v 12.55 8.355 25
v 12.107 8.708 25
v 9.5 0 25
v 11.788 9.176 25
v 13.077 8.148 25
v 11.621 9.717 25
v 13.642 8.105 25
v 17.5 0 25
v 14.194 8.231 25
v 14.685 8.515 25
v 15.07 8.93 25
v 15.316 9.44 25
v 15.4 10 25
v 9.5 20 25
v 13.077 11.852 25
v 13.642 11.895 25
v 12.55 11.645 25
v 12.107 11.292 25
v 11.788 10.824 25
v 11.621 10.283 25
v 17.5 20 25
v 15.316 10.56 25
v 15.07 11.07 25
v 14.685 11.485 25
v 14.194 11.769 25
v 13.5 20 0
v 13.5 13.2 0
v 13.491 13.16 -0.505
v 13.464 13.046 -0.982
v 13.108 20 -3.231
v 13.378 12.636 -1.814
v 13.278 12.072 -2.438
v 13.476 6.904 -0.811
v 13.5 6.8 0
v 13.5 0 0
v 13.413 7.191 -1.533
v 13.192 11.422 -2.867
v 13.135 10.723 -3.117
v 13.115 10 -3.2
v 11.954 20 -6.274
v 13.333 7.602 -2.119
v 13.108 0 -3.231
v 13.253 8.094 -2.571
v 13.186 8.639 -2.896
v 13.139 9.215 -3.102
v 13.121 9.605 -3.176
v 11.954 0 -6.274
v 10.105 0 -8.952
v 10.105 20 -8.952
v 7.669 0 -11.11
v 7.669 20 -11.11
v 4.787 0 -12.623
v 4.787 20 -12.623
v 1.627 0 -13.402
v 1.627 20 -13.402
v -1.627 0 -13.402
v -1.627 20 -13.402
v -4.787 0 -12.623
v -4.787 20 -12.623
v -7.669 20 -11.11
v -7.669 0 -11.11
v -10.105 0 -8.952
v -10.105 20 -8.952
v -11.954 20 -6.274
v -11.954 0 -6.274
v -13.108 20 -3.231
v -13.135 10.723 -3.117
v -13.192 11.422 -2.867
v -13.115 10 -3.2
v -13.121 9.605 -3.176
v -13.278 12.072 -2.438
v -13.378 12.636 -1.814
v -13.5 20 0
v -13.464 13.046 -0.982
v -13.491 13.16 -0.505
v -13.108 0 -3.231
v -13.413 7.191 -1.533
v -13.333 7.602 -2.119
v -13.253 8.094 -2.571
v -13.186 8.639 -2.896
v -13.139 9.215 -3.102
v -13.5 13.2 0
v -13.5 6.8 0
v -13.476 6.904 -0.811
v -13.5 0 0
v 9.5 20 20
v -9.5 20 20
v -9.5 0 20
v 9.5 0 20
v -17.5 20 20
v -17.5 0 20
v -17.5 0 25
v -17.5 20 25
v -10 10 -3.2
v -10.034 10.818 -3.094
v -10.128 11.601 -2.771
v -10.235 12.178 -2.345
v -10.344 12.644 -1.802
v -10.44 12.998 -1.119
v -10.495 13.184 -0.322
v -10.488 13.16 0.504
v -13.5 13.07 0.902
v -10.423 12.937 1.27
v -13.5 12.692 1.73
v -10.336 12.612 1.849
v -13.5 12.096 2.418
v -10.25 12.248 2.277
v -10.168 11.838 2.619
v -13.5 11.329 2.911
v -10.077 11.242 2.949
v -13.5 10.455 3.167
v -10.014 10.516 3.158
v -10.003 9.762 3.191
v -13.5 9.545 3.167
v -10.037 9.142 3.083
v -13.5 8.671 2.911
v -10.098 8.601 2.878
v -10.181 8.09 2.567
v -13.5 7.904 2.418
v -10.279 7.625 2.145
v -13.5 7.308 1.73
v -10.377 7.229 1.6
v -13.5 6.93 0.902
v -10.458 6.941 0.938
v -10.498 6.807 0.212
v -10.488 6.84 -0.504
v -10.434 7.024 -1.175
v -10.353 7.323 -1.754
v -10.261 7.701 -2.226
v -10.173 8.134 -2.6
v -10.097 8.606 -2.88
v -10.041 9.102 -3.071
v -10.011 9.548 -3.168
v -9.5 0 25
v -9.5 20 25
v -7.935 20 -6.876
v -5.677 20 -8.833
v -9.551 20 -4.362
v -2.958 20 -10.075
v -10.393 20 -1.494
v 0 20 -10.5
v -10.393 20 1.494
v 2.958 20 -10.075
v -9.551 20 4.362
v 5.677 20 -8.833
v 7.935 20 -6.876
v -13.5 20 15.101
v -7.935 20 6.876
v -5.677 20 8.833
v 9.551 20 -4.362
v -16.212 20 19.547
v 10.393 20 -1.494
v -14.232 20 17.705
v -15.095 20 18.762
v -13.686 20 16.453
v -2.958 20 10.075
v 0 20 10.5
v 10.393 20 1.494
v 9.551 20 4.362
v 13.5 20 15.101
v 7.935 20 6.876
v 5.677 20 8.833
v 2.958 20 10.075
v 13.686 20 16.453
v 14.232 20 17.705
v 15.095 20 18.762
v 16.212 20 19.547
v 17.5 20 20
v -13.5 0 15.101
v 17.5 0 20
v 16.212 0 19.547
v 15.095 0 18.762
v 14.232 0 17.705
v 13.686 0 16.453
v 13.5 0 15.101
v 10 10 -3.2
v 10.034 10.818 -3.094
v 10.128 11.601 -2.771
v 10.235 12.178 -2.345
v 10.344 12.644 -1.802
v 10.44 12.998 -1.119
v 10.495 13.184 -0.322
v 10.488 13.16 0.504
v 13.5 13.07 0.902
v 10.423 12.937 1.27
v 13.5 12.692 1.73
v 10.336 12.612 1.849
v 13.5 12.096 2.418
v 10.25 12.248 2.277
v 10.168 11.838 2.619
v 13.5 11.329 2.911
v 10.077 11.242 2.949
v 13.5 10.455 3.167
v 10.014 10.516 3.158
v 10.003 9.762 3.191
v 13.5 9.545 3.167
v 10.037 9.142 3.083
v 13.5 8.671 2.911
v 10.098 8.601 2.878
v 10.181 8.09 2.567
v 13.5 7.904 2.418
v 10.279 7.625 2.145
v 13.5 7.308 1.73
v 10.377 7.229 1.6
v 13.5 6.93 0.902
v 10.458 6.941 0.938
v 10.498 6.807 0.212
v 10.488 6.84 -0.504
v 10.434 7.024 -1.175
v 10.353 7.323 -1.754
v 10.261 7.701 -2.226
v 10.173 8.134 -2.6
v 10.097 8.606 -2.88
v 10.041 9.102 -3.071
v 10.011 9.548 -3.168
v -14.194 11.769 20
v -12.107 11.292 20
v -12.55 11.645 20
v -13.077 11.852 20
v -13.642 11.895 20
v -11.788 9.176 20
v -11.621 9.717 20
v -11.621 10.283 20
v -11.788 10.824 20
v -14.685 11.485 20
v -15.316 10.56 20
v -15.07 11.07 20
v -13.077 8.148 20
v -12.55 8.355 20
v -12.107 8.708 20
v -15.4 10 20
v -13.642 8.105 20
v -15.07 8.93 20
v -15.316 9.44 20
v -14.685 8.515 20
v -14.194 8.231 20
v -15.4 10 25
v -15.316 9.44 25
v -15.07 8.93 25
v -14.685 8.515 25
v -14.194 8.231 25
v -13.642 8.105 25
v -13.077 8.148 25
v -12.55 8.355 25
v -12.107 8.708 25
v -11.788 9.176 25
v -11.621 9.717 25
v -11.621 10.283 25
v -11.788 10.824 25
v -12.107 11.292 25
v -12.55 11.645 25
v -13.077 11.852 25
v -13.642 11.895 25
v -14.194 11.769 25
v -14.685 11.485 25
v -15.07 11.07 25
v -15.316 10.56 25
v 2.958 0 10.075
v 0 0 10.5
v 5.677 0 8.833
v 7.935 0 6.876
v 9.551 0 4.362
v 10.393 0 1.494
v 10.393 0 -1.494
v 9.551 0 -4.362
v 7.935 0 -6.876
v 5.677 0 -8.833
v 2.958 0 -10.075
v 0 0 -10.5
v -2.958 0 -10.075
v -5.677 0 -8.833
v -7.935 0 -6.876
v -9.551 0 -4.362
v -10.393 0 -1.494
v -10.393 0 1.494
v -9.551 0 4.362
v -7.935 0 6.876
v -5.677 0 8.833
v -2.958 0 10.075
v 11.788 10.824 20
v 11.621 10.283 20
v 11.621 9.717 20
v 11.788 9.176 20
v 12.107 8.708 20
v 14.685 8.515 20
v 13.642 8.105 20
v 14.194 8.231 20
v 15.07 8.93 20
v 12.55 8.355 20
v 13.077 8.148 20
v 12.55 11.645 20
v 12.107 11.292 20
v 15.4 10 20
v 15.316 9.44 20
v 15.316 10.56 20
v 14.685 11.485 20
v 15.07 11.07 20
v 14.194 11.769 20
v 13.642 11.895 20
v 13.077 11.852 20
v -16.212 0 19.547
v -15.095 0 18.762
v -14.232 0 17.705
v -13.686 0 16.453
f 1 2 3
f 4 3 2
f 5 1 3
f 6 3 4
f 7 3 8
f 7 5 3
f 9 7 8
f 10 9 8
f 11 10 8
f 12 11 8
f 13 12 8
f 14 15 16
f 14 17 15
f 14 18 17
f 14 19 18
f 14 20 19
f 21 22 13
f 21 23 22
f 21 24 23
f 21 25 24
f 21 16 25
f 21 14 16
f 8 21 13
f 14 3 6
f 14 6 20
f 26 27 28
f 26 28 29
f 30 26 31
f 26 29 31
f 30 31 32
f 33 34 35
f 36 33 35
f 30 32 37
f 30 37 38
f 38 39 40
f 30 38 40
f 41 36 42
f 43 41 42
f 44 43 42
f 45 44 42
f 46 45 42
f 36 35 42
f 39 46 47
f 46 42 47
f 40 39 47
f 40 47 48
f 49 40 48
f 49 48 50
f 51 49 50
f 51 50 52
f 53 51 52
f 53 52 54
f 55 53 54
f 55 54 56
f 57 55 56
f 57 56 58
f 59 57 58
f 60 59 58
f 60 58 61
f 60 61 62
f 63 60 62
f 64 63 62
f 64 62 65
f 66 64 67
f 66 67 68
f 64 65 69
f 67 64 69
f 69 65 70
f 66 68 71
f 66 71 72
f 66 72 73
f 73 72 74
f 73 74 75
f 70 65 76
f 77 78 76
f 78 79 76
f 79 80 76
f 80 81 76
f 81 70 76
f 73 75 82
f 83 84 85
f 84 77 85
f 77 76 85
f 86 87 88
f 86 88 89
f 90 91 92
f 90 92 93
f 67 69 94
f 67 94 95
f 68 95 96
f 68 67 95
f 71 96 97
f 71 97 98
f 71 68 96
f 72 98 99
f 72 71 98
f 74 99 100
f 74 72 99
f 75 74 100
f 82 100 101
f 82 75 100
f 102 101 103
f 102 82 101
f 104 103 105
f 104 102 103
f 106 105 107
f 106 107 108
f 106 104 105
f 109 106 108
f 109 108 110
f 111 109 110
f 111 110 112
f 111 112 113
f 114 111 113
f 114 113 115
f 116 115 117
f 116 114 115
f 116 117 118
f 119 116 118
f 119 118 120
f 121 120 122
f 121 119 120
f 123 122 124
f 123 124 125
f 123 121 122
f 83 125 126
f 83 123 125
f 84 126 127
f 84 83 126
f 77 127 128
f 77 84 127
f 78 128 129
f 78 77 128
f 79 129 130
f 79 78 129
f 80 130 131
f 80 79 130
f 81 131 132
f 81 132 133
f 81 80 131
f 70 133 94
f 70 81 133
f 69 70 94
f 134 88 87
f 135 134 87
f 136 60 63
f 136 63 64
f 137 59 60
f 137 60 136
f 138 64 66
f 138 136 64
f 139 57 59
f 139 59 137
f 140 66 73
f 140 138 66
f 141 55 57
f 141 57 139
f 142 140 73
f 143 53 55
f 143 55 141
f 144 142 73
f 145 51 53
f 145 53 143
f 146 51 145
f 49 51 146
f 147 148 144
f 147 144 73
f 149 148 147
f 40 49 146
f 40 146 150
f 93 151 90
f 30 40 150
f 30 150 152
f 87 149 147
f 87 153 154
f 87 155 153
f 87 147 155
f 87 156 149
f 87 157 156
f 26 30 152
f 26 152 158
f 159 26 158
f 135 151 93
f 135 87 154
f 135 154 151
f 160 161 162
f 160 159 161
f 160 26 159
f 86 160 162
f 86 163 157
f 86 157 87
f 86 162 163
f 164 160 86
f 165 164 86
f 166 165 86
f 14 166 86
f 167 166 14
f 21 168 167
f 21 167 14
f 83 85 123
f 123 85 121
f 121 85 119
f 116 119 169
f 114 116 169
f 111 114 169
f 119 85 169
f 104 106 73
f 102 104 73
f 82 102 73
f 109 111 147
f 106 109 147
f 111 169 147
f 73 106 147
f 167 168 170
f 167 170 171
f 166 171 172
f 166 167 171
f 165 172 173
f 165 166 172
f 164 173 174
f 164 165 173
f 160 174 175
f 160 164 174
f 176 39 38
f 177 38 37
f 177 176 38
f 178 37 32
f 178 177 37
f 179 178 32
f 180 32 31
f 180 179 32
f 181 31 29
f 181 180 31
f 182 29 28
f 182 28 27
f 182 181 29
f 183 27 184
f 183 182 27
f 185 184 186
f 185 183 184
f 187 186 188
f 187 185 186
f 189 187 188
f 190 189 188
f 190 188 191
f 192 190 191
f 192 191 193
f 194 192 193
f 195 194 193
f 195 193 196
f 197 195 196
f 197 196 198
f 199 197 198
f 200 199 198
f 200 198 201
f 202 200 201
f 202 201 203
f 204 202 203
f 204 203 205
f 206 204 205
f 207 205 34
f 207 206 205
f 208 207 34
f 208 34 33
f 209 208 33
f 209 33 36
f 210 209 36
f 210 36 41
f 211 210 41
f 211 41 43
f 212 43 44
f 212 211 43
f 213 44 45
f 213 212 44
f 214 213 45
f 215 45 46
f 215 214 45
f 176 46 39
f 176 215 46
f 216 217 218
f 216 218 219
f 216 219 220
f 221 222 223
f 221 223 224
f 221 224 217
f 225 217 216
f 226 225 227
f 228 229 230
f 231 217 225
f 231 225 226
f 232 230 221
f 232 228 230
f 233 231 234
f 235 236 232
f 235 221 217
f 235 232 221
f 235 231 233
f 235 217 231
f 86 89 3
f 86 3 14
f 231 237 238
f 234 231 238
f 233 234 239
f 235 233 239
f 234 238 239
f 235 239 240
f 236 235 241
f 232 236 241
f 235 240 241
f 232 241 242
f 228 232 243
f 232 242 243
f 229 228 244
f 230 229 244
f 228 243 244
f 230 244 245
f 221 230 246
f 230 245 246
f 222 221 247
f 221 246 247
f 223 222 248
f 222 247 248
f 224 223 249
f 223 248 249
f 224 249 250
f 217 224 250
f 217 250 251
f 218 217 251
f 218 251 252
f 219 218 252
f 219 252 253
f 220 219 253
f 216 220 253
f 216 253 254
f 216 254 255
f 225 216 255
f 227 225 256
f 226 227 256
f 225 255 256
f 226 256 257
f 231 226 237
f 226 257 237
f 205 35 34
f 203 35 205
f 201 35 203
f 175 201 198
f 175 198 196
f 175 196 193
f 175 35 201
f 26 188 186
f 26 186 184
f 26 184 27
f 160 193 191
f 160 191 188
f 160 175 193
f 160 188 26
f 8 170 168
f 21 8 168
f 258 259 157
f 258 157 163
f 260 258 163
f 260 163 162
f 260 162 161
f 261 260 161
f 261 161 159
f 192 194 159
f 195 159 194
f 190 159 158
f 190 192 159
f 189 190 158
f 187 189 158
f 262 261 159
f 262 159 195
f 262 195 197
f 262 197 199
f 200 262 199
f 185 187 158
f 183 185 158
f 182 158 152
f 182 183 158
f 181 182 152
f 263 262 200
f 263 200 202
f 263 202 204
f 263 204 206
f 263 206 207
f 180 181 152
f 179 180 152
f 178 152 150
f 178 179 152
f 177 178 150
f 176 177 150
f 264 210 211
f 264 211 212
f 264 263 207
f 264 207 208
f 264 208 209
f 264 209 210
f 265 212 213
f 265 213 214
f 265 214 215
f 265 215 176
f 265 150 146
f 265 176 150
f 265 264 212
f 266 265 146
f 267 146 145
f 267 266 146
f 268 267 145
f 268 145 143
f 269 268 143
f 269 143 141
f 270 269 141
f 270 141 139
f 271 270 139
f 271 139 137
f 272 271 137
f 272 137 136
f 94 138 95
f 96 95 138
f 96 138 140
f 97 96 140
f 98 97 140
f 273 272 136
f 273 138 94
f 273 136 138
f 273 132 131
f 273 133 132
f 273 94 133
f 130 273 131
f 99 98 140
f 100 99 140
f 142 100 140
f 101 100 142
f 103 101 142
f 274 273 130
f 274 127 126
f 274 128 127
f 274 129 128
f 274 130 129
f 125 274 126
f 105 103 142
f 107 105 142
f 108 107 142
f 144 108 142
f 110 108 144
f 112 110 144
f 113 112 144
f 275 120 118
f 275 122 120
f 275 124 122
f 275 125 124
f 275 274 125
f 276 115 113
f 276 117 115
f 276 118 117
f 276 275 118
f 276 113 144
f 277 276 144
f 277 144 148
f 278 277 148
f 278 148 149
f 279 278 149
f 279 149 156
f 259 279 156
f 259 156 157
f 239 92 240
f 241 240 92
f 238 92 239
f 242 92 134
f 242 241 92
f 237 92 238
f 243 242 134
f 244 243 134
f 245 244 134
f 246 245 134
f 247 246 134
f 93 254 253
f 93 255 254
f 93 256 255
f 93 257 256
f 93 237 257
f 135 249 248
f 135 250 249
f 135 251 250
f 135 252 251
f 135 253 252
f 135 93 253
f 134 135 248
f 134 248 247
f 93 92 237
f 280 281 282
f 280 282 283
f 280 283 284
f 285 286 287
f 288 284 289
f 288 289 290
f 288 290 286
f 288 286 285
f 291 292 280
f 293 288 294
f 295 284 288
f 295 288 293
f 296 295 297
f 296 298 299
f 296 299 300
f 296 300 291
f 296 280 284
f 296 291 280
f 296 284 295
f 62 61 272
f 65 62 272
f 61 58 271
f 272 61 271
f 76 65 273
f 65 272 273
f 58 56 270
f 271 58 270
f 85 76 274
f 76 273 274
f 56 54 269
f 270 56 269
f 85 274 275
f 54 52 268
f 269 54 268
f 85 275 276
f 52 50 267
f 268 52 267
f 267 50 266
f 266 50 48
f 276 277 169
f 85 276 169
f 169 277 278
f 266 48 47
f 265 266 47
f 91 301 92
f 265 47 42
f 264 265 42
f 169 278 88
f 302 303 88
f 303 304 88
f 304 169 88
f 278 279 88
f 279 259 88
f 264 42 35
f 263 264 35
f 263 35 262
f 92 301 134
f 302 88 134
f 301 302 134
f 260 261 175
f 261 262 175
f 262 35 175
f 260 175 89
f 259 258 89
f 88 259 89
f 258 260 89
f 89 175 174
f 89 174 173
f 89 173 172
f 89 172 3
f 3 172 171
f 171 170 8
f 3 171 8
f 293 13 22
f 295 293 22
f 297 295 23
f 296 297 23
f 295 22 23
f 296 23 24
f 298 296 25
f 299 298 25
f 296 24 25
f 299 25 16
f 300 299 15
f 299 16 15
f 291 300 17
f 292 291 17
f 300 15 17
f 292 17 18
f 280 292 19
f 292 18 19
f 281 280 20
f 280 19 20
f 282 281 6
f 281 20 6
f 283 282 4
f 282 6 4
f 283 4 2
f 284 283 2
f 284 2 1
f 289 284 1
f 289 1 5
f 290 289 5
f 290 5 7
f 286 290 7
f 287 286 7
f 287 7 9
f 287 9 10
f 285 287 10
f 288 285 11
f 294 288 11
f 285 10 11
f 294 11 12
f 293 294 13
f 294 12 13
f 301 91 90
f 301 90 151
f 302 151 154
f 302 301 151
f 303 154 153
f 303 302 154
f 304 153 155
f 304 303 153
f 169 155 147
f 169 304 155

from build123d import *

# Parameters (mm, degrees)
SKETCH_1_R               = 13.5
SKETCH_1_R_2             = 10.5
EXTRUDE_1_DEPTH          = 20
EXTRUDE_2_REACH          = 43.286
EXTRUDE_2_END_RADIUS     = 13.5
SKETCH_5_W               = 27
SKETCH_5_H               = 20
CUT_EXTRUDE_2_DEPTH      = 32.340867888
CUT_EXTRUDE_2_DEPTH_BACK = 32.340867888
SKETCH_2_R               = 3.2
SKETCH_6_W               = 4
SKETCH_6_H               = 20
EXTRUDE_4_DEPTH          = 5
FILLET_1_R               = 5
SKETCH_7_R               = 1.9
CUT_EXTRUDE_3_DEPTH      = 5


with BuildPart() as part:
    # 草图1 → 凸台-拉伸1 (new body)
    with BuildSketch(Plane(origin=(0, 0, 0), x_dir=(1, 0, 0), z_dir=(0, 1, 0))):
        with Locations(Location((0, 0, 0), (0, 0, 270))):
            Circle(SKETCH_1_R)
        with Locations(Location((0, 0, 0), (0, 0, 270))):
            Circle(SKETCH_1_R_2, mode=Mode.SUBTRACT)
    extrude(amount=EXTRUDE_1_DEPTH)

    # 凸台-拉伸2: up to this cylinder (the profile starts outside it)
    extrude_2_end = Plane(origin=(0, 10, 0), z_dir=(0, -1, 0)) * Cylinder(EXTRUDE_2_END_RADIUS, 114.572, mode=Mode.PRIVATE)
    # 草图5 → 凸台-拉伸2 (add, up to the surface)
    with BuildSketch(Plane.XY.offset(20), mode=Mode.PRIVATE) as extrude_2_sk1:
        with Locations((0, 10)):
            Rectangle(SKETCH_5_W, SKETCH_5_H)
    extrude_2_tool1 = extrude(extrude_2_sk1.sketch, amount=-EXTRUDE_2_REACH, mode=Mode.PRIVATE) - extrude_2_end
    add(extrude_2_tool1.solids().sort_by_distance((0, 10, 20))[0])

    # 草图2 → 切除-拉伸2 (cut, two sides: drawn at the far end of the back side and taken through both)
    with BuildSketch(Plane(origin=(0, 0, 0), x_dir=(0, 0, -1), z_dir=(1, 0, 0)).offset(-CUT_EXTRUDE_2_DEPTH_BACK)):
        with Locations((0, 10)):
            Circle(SKETCH_2_R)
    extrude(amount=CUT_EXTRUDE_2_DEPTH + CUT_EXTRUDE_2_DEPTH_BACK, mode=Mode.SUBTRACT)

    # 草图6 → 凸台-拉伸4 (add)
    with BuildSketch(Plane.XY.offset(20)):
        with Locations((15.5, 10)):
            Rectangle(SKETCH_6_W, SKETCH_6_H)
        with Locations((11.5, 10)):
            Rectangle(SKETCH_6_W, SKETCH_6_H)
        with Locations((-11.5, 10)):
            Rectangle(SKETCH_6_W, SKETCH_6_H)
        with Locations((-15.5, 10)):
            Rectangle(SKETCH_6_W, SKETCH_6_H)
    extrude(amount=EXTRUDE_4_DEPTH)

    # 圆角1
    # the kernel refuses this fillet: 5 mm, written as the material it adds along each edge
    with BuildSketch(Plane(origin=(13.5, 20, 20), x_dir=(0, 0, -1), z_dir=(0, -1, 0)), Plane(origin=(-13.5, 0, 20), x_dir=(0, 0, -1), z_dir=(0, 1, 0))) as fillet_1_piece_1:
        with BuildLine():
            CenterArc((4.898979486, 5), FILLET_1_R, 191.536959033, 78.463040967)
            Line((0, 4), (-0.09797959, 3.98))
            ThreePointArc((-0.09797959, 3.98), (-0.1, 2), (-0.1, 0))
            Line((-0.1, 0), (0, -0.1))
            Line((0, -0.1), (4.898979486, -0.1))
            Line((4.898979486, -0.1), (4.898979486, 0))
        make_face()
    extrude(amount=20)

    # 草图7 → 切除-拉伸3 (cut)
    with BuildSketch(Plane.XY.offset(25)):
        with Locations((13.5, 10)):
            Circle(SKETCH_7_R)
        with Locations(Location((-13.5, 10, 0), (0, 0, 180))):
            Circle(SKETCH_7_R)
    extrude(amount=-CUT_EXTRUDE_3_DEPTH, mode=Mode.SUBTRACT)


solid = part.part
